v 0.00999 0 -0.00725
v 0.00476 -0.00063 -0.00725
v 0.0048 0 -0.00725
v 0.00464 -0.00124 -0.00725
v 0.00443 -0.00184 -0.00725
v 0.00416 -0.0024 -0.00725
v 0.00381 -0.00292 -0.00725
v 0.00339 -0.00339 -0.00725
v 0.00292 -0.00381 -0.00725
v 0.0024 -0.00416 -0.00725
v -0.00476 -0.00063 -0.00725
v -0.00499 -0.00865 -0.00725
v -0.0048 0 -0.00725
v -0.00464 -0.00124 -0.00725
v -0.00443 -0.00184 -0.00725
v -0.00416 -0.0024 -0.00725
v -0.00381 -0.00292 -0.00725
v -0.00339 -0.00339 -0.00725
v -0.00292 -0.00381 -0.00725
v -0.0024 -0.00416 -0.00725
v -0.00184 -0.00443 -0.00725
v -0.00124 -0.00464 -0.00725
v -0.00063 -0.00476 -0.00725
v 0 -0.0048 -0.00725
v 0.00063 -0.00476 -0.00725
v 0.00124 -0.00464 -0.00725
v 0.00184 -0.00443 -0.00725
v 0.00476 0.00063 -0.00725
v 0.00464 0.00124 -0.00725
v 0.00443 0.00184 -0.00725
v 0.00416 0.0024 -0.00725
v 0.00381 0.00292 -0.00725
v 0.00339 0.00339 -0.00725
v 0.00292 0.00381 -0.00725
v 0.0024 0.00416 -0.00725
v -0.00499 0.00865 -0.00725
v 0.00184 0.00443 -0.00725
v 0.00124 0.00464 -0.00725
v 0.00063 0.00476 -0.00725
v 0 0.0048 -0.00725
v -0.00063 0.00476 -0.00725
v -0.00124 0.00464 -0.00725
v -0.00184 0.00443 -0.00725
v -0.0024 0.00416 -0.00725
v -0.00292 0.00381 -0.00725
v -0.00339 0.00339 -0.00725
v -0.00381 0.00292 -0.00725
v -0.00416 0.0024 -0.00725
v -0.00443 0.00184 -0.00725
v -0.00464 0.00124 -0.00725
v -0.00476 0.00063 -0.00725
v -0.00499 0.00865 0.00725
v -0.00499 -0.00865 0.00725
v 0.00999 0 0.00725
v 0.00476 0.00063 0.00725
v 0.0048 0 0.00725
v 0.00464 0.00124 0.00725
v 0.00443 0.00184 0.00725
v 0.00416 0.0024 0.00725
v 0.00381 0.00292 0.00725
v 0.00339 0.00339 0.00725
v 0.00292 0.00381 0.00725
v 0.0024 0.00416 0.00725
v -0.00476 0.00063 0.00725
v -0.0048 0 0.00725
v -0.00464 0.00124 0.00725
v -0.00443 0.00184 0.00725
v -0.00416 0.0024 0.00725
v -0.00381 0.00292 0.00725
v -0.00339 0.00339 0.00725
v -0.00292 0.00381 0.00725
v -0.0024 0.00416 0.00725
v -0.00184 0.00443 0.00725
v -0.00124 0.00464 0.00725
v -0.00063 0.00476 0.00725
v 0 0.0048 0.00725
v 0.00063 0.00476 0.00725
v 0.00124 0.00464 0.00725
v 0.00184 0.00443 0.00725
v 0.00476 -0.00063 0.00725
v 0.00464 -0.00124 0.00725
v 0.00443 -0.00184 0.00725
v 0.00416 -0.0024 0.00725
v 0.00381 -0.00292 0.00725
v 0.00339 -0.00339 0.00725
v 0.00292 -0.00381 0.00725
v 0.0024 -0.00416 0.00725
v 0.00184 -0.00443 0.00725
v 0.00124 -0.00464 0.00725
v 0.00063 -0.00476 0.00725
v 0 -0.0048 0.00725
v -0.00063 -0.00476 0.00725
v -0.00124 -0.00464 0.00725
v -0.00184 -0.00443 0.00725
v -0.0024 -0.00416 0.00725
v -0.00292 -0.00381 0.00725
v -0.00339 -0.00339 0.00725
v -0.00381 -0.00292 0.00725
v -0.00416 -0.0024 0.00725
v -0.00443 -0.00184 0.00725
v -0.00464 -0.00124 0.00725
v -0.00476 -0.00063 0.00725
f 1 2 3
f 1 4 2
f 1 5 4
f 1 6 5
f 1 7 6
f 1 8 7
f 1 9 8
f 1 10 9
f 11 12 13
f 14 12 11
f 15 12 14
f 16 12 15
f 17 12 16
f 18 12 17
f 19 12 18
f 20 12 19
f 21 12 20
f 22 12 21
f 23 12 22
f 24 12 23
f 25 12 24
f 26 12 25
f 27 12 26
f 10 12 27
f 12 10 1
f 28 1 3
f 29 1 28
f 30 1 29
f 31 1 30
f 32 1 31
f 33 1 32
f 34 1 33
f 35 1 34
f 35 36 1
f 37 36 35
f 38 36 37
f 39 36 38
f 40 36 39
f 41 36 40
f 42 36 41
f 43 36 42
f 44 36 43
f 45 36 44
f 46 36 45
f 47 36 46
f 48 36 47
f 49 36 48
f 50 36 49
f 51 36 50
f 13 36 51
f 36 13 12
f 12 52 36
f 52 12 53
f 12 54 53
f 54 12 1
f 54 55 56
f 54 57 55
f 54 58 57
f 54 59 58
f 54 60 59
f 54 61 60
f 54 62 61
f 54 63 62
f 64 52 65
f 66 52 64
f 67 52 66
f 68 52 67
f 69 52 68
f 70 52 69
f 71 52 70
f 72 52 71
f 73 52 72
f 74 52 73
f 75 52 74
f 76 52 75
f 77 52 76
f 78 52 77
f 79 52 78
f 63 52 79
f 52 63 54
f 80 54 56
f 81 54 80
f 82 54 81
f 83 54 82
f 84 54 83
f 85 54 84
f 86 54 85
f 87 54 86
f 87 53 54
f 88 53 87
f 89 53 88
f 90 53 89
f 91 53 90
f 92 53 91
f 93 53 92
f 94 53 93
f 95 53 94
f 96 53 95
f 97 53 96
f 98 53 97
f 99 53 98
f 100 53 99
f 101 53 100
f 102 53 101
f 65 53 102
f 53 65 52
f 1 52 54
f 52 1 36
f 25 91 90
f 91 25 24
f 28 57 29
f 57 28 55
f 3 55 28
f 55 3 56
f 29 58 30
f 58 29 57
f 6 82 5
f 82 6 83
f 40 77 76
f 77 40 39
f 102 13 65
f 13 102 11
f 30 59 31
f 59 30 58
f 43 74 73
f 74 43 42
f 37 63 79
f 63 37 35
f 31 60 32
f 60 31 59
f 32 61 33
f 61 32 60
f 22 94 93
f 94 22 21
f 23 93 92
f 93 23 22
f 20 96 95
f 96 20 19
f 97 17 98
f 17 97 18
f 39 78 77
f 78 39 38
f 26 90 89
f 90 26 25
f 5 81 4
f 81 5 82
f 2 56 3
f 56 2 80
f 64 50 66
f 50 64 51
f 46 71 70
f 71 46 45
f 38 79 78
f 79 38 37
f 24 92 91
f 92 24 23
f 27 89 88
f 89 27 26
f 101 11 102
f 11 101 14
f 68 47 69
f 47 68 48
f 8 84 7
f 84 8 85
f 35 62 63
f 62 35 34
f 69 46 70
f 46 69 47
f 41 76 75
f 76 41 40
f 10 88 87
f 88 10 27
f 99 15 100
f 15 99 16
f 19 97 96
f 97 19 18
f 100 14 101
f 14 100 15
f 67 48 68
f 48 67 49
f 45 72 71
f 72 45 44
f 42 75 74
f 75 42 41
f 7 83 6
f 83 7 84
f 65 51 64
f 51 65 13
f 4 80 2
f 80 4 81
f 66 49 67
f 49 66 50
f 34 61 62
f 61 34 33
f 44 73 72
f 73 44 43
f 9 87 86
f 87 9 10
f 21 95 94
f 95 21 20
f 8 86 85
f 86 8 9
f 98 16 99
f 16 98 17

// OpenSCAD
// Parametric hollow triangular training block.
// Units are metres because this geometry is consumed directly by URDF.
$fn = 48;

outer_radius = 0.010;
hole_radius = 0.0048;
depth = 0.0145;

difference() {
    linear_extrude(height = depth, center = true, convexity = 4)
        polygon(points = [
            [outer_radius, 0],
            [-outer_radius / 2, sqrt(3) * outer_radius / 2],
            [-outer_radius / 2, -sqrt(3) * outer_radius / 2]
        ]);

    // Extend the cutter beyond both faces to avoid coincident CSG surfaces.
    cylinder(h = depth + 0.002, r = hole_radius, center = true);
}
